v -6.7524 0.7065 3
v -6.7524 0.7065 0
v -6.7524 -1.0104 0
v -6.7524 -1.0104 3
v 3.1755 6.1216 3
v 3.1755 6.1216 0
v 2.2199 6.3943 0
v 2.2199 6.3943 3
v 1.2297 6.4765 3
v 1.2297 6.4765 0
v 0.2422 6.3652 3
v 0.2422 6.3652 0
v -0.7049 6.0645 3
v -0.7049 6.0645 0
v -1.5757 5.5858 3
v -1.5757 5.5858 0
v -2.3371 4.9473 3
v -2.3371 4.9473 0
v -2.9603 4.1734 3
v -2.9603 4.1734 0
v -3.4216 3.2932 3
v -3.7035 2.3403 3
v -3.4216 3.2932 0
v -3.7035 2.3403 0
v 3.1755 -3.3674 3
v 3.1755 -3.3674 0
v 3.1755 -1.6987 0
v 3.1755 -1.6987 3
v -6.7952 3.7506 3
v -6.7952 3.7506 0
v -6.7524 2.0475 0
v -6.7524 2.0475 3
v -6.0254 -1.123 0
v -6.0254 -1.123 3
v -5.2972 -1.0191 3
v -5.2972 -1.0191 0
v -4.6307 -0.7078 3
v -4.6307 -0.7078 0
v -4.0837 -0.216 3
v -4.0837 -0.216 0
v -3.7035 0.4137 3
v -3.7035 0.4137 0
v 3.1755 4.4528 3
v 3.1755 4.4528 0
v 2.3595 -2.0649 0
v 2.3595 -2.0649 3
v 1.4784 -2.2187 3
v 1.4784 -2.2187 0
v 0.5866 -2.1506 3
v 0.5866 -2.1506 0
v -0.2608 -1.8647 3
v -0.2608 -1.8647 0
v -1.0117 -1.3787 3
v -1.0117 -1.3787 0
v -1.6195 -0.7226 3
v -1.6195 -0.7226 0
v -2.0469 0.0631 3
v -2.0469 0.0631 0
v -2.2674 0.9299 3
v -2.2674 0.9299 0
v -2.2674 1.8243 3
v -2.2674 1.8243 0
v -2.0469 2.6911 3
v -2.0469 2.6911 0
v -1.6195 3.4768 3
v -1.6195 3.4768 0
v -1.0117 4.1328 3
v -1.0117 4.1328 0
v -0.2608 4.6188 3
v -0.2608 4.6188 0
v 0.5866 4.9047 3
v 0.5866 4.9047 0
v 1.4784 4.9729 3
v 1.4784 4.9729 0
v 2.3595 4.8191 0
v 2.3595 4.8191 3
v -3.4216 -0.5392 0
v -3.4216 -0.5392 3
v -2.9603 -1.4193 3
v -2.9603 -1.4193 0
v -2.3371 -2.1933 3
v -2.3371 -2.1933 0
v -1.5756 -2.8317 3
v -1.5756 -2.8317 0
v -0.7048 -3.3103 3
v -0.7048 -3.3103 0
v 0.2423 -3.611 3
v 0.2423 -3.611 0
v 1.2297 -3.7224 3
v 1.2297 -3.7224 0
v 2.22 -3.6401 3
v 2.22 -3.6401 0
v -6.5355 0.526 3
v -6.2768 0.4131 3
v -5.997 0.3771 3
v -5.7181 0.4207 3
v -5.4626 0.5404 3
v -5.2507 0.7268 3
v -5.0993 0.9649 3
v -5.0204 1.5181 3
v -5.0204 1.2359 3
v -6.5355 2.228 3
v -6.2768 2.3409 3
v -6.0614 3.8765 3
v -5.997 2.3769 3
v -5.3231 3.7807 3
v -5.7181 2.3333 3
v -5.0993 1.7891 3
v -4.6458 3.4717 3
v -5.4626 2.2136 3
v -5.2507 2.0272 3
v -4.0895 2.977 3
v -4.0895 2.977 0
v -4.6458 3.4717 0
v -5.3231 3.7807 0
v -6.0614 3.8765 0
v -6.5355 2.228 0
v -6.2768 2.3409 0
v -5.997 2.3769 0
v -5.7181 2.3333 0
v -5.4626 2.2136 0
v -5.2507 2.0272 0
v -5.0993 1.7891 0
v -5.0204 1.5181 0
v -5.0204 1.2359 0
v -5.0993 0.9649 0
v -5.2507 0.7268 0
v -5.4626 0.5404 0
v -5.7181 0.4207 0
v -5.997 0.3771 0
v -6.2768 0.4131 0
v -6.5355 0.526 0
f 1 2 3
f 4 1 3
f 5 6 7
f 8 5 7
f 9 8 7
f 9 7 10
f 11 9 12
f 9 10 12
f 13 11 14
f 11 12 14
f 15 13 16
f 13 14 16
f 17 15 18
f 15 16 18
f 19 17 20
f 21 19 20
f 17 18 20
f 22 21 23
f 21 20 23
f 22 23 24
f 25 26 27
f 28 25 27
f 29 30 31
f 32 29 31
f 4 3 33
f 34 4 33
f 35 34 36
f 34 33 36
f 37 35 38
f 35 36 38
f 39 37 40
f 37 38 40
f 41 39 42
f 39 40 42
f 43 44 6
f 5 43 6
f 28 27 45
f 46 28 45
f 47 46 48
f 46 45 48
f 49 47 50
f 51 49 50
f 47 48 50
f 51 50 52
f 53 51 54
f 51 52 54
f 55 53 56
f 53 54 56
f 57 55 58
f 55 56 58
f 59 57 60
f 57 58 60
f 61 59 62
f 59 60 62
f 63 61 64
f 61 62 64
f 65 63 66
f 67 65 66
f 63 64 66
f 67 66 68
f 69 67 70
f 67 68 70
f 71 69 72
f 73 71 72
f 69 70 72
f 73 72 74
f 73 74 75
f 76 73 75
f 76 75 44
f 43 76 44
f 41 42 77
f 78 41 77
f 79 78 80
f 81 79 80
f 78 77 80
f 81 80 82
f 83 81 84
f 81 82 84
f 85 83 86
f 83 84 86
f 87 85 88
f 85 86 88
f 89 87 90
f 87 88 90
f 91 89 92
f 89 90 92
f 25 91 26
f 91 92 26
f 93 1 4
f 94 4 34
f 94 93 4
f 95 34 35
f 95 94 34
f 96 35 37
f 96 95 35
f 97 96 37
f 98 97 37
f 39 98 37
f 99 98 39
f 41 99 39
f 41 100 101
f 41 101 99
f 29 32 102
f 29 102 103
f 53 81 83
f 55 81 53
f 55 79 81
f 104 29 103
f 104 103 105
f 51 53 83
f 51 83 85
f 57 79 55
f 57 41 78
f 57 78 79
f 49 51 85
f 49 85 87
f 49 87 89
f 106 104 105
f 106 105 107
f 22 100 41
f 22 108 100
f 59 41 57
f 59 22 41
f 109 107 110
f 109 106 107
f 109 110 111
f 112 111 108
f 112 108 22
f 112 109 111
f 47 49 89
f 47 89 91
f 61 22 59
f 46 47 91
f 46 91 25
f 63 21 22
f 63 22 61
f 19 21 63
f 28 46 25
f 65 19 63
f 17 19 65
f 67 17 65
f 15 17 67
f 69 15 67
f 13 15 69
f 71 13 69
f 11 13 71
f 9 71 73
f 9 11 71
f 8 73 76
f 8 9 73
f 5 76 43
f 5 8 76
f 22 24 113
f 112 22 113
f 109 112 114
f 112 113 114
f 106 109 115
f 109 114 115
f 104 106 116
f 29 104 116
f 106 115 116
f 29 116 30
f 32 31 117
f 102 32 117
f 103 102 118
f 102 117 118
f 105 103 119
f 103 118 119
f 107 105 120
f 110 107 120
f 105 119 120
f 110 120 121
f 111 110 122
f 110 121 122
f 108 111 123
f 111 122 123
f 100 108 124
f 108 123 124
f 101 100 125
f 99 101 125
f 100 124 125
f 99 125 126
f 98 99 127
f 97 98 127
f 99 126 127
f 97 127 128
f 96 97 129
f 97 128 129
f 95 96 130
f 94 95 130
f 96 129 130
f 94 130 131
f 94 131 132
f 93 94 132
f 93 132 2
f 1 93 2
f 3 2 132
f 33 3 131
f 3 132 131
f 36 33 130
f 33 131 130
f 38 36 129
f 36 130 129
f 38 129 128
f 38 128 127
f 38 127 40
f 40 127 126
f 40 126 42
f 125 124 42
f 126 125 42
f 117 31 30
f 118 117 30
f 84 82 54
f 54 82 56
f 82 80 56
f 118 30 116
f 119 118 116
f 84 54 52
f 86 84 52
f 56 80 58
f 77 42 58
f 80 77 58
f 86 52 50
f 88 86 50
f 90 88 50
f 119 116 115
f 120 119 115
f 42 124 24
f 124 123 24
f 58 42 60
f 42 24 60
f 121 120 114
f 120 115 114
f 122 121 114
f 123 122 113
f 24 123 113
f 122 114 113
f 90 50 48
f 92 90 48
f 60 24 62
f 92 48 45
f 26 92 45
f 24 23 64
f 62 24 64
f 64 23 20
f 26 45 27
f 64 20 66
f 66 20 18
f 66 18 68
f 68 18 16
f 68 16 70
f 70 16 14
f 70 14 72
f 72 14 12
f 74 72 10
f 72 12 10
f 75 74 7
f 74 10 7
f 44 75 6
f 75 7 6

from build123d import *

# Parameters (mm, degrees)
F1_DEPTH = 3


with BuildPart() as f1:
    # F0 (on Top) → F1 (new body)
    with BuildSketch(Plane.XY):
        with BuildLine():
            ThreePointArc((3.175484, -1.698676), (-2.295284, 1.377072), (3.175484, 4.452821))
            Line((3.175484, 4.452821), (3.175484, 6.121567))
            ThreePointArc((3.175484, 6.121567), (-1.151965, 5.846381), (-3.703487, 2.340347))
            ThreePointArc((-3.703487, 2.340347), (-4.972885, 3.651534), (-6.795181, 3.750636))
            Line((-6.795181, 3.750636), (-6.752376, 2.047452))
            ThreePointArc((-6.752376, 2.047452), (-5.010425, 1.376998), (-6.752376, 0.706545))
            Line((-6.752376, 0.706545), (-6.752376, -1.010366))
            ThreePointArc((-6.752376, -1.010366), (-4.952455, -0.888107), (-3.703468, 0.413697))
            ThreePointArc((-3.703468, 0.413697), (-1.15192, -3.092261), (3.175484, -3.367422))
            Line((3.175484, -3.367422), (3.175484, -1.698676))
        make_face()
    extrude(amount=F1_DEPTH)


solid = f1.part
